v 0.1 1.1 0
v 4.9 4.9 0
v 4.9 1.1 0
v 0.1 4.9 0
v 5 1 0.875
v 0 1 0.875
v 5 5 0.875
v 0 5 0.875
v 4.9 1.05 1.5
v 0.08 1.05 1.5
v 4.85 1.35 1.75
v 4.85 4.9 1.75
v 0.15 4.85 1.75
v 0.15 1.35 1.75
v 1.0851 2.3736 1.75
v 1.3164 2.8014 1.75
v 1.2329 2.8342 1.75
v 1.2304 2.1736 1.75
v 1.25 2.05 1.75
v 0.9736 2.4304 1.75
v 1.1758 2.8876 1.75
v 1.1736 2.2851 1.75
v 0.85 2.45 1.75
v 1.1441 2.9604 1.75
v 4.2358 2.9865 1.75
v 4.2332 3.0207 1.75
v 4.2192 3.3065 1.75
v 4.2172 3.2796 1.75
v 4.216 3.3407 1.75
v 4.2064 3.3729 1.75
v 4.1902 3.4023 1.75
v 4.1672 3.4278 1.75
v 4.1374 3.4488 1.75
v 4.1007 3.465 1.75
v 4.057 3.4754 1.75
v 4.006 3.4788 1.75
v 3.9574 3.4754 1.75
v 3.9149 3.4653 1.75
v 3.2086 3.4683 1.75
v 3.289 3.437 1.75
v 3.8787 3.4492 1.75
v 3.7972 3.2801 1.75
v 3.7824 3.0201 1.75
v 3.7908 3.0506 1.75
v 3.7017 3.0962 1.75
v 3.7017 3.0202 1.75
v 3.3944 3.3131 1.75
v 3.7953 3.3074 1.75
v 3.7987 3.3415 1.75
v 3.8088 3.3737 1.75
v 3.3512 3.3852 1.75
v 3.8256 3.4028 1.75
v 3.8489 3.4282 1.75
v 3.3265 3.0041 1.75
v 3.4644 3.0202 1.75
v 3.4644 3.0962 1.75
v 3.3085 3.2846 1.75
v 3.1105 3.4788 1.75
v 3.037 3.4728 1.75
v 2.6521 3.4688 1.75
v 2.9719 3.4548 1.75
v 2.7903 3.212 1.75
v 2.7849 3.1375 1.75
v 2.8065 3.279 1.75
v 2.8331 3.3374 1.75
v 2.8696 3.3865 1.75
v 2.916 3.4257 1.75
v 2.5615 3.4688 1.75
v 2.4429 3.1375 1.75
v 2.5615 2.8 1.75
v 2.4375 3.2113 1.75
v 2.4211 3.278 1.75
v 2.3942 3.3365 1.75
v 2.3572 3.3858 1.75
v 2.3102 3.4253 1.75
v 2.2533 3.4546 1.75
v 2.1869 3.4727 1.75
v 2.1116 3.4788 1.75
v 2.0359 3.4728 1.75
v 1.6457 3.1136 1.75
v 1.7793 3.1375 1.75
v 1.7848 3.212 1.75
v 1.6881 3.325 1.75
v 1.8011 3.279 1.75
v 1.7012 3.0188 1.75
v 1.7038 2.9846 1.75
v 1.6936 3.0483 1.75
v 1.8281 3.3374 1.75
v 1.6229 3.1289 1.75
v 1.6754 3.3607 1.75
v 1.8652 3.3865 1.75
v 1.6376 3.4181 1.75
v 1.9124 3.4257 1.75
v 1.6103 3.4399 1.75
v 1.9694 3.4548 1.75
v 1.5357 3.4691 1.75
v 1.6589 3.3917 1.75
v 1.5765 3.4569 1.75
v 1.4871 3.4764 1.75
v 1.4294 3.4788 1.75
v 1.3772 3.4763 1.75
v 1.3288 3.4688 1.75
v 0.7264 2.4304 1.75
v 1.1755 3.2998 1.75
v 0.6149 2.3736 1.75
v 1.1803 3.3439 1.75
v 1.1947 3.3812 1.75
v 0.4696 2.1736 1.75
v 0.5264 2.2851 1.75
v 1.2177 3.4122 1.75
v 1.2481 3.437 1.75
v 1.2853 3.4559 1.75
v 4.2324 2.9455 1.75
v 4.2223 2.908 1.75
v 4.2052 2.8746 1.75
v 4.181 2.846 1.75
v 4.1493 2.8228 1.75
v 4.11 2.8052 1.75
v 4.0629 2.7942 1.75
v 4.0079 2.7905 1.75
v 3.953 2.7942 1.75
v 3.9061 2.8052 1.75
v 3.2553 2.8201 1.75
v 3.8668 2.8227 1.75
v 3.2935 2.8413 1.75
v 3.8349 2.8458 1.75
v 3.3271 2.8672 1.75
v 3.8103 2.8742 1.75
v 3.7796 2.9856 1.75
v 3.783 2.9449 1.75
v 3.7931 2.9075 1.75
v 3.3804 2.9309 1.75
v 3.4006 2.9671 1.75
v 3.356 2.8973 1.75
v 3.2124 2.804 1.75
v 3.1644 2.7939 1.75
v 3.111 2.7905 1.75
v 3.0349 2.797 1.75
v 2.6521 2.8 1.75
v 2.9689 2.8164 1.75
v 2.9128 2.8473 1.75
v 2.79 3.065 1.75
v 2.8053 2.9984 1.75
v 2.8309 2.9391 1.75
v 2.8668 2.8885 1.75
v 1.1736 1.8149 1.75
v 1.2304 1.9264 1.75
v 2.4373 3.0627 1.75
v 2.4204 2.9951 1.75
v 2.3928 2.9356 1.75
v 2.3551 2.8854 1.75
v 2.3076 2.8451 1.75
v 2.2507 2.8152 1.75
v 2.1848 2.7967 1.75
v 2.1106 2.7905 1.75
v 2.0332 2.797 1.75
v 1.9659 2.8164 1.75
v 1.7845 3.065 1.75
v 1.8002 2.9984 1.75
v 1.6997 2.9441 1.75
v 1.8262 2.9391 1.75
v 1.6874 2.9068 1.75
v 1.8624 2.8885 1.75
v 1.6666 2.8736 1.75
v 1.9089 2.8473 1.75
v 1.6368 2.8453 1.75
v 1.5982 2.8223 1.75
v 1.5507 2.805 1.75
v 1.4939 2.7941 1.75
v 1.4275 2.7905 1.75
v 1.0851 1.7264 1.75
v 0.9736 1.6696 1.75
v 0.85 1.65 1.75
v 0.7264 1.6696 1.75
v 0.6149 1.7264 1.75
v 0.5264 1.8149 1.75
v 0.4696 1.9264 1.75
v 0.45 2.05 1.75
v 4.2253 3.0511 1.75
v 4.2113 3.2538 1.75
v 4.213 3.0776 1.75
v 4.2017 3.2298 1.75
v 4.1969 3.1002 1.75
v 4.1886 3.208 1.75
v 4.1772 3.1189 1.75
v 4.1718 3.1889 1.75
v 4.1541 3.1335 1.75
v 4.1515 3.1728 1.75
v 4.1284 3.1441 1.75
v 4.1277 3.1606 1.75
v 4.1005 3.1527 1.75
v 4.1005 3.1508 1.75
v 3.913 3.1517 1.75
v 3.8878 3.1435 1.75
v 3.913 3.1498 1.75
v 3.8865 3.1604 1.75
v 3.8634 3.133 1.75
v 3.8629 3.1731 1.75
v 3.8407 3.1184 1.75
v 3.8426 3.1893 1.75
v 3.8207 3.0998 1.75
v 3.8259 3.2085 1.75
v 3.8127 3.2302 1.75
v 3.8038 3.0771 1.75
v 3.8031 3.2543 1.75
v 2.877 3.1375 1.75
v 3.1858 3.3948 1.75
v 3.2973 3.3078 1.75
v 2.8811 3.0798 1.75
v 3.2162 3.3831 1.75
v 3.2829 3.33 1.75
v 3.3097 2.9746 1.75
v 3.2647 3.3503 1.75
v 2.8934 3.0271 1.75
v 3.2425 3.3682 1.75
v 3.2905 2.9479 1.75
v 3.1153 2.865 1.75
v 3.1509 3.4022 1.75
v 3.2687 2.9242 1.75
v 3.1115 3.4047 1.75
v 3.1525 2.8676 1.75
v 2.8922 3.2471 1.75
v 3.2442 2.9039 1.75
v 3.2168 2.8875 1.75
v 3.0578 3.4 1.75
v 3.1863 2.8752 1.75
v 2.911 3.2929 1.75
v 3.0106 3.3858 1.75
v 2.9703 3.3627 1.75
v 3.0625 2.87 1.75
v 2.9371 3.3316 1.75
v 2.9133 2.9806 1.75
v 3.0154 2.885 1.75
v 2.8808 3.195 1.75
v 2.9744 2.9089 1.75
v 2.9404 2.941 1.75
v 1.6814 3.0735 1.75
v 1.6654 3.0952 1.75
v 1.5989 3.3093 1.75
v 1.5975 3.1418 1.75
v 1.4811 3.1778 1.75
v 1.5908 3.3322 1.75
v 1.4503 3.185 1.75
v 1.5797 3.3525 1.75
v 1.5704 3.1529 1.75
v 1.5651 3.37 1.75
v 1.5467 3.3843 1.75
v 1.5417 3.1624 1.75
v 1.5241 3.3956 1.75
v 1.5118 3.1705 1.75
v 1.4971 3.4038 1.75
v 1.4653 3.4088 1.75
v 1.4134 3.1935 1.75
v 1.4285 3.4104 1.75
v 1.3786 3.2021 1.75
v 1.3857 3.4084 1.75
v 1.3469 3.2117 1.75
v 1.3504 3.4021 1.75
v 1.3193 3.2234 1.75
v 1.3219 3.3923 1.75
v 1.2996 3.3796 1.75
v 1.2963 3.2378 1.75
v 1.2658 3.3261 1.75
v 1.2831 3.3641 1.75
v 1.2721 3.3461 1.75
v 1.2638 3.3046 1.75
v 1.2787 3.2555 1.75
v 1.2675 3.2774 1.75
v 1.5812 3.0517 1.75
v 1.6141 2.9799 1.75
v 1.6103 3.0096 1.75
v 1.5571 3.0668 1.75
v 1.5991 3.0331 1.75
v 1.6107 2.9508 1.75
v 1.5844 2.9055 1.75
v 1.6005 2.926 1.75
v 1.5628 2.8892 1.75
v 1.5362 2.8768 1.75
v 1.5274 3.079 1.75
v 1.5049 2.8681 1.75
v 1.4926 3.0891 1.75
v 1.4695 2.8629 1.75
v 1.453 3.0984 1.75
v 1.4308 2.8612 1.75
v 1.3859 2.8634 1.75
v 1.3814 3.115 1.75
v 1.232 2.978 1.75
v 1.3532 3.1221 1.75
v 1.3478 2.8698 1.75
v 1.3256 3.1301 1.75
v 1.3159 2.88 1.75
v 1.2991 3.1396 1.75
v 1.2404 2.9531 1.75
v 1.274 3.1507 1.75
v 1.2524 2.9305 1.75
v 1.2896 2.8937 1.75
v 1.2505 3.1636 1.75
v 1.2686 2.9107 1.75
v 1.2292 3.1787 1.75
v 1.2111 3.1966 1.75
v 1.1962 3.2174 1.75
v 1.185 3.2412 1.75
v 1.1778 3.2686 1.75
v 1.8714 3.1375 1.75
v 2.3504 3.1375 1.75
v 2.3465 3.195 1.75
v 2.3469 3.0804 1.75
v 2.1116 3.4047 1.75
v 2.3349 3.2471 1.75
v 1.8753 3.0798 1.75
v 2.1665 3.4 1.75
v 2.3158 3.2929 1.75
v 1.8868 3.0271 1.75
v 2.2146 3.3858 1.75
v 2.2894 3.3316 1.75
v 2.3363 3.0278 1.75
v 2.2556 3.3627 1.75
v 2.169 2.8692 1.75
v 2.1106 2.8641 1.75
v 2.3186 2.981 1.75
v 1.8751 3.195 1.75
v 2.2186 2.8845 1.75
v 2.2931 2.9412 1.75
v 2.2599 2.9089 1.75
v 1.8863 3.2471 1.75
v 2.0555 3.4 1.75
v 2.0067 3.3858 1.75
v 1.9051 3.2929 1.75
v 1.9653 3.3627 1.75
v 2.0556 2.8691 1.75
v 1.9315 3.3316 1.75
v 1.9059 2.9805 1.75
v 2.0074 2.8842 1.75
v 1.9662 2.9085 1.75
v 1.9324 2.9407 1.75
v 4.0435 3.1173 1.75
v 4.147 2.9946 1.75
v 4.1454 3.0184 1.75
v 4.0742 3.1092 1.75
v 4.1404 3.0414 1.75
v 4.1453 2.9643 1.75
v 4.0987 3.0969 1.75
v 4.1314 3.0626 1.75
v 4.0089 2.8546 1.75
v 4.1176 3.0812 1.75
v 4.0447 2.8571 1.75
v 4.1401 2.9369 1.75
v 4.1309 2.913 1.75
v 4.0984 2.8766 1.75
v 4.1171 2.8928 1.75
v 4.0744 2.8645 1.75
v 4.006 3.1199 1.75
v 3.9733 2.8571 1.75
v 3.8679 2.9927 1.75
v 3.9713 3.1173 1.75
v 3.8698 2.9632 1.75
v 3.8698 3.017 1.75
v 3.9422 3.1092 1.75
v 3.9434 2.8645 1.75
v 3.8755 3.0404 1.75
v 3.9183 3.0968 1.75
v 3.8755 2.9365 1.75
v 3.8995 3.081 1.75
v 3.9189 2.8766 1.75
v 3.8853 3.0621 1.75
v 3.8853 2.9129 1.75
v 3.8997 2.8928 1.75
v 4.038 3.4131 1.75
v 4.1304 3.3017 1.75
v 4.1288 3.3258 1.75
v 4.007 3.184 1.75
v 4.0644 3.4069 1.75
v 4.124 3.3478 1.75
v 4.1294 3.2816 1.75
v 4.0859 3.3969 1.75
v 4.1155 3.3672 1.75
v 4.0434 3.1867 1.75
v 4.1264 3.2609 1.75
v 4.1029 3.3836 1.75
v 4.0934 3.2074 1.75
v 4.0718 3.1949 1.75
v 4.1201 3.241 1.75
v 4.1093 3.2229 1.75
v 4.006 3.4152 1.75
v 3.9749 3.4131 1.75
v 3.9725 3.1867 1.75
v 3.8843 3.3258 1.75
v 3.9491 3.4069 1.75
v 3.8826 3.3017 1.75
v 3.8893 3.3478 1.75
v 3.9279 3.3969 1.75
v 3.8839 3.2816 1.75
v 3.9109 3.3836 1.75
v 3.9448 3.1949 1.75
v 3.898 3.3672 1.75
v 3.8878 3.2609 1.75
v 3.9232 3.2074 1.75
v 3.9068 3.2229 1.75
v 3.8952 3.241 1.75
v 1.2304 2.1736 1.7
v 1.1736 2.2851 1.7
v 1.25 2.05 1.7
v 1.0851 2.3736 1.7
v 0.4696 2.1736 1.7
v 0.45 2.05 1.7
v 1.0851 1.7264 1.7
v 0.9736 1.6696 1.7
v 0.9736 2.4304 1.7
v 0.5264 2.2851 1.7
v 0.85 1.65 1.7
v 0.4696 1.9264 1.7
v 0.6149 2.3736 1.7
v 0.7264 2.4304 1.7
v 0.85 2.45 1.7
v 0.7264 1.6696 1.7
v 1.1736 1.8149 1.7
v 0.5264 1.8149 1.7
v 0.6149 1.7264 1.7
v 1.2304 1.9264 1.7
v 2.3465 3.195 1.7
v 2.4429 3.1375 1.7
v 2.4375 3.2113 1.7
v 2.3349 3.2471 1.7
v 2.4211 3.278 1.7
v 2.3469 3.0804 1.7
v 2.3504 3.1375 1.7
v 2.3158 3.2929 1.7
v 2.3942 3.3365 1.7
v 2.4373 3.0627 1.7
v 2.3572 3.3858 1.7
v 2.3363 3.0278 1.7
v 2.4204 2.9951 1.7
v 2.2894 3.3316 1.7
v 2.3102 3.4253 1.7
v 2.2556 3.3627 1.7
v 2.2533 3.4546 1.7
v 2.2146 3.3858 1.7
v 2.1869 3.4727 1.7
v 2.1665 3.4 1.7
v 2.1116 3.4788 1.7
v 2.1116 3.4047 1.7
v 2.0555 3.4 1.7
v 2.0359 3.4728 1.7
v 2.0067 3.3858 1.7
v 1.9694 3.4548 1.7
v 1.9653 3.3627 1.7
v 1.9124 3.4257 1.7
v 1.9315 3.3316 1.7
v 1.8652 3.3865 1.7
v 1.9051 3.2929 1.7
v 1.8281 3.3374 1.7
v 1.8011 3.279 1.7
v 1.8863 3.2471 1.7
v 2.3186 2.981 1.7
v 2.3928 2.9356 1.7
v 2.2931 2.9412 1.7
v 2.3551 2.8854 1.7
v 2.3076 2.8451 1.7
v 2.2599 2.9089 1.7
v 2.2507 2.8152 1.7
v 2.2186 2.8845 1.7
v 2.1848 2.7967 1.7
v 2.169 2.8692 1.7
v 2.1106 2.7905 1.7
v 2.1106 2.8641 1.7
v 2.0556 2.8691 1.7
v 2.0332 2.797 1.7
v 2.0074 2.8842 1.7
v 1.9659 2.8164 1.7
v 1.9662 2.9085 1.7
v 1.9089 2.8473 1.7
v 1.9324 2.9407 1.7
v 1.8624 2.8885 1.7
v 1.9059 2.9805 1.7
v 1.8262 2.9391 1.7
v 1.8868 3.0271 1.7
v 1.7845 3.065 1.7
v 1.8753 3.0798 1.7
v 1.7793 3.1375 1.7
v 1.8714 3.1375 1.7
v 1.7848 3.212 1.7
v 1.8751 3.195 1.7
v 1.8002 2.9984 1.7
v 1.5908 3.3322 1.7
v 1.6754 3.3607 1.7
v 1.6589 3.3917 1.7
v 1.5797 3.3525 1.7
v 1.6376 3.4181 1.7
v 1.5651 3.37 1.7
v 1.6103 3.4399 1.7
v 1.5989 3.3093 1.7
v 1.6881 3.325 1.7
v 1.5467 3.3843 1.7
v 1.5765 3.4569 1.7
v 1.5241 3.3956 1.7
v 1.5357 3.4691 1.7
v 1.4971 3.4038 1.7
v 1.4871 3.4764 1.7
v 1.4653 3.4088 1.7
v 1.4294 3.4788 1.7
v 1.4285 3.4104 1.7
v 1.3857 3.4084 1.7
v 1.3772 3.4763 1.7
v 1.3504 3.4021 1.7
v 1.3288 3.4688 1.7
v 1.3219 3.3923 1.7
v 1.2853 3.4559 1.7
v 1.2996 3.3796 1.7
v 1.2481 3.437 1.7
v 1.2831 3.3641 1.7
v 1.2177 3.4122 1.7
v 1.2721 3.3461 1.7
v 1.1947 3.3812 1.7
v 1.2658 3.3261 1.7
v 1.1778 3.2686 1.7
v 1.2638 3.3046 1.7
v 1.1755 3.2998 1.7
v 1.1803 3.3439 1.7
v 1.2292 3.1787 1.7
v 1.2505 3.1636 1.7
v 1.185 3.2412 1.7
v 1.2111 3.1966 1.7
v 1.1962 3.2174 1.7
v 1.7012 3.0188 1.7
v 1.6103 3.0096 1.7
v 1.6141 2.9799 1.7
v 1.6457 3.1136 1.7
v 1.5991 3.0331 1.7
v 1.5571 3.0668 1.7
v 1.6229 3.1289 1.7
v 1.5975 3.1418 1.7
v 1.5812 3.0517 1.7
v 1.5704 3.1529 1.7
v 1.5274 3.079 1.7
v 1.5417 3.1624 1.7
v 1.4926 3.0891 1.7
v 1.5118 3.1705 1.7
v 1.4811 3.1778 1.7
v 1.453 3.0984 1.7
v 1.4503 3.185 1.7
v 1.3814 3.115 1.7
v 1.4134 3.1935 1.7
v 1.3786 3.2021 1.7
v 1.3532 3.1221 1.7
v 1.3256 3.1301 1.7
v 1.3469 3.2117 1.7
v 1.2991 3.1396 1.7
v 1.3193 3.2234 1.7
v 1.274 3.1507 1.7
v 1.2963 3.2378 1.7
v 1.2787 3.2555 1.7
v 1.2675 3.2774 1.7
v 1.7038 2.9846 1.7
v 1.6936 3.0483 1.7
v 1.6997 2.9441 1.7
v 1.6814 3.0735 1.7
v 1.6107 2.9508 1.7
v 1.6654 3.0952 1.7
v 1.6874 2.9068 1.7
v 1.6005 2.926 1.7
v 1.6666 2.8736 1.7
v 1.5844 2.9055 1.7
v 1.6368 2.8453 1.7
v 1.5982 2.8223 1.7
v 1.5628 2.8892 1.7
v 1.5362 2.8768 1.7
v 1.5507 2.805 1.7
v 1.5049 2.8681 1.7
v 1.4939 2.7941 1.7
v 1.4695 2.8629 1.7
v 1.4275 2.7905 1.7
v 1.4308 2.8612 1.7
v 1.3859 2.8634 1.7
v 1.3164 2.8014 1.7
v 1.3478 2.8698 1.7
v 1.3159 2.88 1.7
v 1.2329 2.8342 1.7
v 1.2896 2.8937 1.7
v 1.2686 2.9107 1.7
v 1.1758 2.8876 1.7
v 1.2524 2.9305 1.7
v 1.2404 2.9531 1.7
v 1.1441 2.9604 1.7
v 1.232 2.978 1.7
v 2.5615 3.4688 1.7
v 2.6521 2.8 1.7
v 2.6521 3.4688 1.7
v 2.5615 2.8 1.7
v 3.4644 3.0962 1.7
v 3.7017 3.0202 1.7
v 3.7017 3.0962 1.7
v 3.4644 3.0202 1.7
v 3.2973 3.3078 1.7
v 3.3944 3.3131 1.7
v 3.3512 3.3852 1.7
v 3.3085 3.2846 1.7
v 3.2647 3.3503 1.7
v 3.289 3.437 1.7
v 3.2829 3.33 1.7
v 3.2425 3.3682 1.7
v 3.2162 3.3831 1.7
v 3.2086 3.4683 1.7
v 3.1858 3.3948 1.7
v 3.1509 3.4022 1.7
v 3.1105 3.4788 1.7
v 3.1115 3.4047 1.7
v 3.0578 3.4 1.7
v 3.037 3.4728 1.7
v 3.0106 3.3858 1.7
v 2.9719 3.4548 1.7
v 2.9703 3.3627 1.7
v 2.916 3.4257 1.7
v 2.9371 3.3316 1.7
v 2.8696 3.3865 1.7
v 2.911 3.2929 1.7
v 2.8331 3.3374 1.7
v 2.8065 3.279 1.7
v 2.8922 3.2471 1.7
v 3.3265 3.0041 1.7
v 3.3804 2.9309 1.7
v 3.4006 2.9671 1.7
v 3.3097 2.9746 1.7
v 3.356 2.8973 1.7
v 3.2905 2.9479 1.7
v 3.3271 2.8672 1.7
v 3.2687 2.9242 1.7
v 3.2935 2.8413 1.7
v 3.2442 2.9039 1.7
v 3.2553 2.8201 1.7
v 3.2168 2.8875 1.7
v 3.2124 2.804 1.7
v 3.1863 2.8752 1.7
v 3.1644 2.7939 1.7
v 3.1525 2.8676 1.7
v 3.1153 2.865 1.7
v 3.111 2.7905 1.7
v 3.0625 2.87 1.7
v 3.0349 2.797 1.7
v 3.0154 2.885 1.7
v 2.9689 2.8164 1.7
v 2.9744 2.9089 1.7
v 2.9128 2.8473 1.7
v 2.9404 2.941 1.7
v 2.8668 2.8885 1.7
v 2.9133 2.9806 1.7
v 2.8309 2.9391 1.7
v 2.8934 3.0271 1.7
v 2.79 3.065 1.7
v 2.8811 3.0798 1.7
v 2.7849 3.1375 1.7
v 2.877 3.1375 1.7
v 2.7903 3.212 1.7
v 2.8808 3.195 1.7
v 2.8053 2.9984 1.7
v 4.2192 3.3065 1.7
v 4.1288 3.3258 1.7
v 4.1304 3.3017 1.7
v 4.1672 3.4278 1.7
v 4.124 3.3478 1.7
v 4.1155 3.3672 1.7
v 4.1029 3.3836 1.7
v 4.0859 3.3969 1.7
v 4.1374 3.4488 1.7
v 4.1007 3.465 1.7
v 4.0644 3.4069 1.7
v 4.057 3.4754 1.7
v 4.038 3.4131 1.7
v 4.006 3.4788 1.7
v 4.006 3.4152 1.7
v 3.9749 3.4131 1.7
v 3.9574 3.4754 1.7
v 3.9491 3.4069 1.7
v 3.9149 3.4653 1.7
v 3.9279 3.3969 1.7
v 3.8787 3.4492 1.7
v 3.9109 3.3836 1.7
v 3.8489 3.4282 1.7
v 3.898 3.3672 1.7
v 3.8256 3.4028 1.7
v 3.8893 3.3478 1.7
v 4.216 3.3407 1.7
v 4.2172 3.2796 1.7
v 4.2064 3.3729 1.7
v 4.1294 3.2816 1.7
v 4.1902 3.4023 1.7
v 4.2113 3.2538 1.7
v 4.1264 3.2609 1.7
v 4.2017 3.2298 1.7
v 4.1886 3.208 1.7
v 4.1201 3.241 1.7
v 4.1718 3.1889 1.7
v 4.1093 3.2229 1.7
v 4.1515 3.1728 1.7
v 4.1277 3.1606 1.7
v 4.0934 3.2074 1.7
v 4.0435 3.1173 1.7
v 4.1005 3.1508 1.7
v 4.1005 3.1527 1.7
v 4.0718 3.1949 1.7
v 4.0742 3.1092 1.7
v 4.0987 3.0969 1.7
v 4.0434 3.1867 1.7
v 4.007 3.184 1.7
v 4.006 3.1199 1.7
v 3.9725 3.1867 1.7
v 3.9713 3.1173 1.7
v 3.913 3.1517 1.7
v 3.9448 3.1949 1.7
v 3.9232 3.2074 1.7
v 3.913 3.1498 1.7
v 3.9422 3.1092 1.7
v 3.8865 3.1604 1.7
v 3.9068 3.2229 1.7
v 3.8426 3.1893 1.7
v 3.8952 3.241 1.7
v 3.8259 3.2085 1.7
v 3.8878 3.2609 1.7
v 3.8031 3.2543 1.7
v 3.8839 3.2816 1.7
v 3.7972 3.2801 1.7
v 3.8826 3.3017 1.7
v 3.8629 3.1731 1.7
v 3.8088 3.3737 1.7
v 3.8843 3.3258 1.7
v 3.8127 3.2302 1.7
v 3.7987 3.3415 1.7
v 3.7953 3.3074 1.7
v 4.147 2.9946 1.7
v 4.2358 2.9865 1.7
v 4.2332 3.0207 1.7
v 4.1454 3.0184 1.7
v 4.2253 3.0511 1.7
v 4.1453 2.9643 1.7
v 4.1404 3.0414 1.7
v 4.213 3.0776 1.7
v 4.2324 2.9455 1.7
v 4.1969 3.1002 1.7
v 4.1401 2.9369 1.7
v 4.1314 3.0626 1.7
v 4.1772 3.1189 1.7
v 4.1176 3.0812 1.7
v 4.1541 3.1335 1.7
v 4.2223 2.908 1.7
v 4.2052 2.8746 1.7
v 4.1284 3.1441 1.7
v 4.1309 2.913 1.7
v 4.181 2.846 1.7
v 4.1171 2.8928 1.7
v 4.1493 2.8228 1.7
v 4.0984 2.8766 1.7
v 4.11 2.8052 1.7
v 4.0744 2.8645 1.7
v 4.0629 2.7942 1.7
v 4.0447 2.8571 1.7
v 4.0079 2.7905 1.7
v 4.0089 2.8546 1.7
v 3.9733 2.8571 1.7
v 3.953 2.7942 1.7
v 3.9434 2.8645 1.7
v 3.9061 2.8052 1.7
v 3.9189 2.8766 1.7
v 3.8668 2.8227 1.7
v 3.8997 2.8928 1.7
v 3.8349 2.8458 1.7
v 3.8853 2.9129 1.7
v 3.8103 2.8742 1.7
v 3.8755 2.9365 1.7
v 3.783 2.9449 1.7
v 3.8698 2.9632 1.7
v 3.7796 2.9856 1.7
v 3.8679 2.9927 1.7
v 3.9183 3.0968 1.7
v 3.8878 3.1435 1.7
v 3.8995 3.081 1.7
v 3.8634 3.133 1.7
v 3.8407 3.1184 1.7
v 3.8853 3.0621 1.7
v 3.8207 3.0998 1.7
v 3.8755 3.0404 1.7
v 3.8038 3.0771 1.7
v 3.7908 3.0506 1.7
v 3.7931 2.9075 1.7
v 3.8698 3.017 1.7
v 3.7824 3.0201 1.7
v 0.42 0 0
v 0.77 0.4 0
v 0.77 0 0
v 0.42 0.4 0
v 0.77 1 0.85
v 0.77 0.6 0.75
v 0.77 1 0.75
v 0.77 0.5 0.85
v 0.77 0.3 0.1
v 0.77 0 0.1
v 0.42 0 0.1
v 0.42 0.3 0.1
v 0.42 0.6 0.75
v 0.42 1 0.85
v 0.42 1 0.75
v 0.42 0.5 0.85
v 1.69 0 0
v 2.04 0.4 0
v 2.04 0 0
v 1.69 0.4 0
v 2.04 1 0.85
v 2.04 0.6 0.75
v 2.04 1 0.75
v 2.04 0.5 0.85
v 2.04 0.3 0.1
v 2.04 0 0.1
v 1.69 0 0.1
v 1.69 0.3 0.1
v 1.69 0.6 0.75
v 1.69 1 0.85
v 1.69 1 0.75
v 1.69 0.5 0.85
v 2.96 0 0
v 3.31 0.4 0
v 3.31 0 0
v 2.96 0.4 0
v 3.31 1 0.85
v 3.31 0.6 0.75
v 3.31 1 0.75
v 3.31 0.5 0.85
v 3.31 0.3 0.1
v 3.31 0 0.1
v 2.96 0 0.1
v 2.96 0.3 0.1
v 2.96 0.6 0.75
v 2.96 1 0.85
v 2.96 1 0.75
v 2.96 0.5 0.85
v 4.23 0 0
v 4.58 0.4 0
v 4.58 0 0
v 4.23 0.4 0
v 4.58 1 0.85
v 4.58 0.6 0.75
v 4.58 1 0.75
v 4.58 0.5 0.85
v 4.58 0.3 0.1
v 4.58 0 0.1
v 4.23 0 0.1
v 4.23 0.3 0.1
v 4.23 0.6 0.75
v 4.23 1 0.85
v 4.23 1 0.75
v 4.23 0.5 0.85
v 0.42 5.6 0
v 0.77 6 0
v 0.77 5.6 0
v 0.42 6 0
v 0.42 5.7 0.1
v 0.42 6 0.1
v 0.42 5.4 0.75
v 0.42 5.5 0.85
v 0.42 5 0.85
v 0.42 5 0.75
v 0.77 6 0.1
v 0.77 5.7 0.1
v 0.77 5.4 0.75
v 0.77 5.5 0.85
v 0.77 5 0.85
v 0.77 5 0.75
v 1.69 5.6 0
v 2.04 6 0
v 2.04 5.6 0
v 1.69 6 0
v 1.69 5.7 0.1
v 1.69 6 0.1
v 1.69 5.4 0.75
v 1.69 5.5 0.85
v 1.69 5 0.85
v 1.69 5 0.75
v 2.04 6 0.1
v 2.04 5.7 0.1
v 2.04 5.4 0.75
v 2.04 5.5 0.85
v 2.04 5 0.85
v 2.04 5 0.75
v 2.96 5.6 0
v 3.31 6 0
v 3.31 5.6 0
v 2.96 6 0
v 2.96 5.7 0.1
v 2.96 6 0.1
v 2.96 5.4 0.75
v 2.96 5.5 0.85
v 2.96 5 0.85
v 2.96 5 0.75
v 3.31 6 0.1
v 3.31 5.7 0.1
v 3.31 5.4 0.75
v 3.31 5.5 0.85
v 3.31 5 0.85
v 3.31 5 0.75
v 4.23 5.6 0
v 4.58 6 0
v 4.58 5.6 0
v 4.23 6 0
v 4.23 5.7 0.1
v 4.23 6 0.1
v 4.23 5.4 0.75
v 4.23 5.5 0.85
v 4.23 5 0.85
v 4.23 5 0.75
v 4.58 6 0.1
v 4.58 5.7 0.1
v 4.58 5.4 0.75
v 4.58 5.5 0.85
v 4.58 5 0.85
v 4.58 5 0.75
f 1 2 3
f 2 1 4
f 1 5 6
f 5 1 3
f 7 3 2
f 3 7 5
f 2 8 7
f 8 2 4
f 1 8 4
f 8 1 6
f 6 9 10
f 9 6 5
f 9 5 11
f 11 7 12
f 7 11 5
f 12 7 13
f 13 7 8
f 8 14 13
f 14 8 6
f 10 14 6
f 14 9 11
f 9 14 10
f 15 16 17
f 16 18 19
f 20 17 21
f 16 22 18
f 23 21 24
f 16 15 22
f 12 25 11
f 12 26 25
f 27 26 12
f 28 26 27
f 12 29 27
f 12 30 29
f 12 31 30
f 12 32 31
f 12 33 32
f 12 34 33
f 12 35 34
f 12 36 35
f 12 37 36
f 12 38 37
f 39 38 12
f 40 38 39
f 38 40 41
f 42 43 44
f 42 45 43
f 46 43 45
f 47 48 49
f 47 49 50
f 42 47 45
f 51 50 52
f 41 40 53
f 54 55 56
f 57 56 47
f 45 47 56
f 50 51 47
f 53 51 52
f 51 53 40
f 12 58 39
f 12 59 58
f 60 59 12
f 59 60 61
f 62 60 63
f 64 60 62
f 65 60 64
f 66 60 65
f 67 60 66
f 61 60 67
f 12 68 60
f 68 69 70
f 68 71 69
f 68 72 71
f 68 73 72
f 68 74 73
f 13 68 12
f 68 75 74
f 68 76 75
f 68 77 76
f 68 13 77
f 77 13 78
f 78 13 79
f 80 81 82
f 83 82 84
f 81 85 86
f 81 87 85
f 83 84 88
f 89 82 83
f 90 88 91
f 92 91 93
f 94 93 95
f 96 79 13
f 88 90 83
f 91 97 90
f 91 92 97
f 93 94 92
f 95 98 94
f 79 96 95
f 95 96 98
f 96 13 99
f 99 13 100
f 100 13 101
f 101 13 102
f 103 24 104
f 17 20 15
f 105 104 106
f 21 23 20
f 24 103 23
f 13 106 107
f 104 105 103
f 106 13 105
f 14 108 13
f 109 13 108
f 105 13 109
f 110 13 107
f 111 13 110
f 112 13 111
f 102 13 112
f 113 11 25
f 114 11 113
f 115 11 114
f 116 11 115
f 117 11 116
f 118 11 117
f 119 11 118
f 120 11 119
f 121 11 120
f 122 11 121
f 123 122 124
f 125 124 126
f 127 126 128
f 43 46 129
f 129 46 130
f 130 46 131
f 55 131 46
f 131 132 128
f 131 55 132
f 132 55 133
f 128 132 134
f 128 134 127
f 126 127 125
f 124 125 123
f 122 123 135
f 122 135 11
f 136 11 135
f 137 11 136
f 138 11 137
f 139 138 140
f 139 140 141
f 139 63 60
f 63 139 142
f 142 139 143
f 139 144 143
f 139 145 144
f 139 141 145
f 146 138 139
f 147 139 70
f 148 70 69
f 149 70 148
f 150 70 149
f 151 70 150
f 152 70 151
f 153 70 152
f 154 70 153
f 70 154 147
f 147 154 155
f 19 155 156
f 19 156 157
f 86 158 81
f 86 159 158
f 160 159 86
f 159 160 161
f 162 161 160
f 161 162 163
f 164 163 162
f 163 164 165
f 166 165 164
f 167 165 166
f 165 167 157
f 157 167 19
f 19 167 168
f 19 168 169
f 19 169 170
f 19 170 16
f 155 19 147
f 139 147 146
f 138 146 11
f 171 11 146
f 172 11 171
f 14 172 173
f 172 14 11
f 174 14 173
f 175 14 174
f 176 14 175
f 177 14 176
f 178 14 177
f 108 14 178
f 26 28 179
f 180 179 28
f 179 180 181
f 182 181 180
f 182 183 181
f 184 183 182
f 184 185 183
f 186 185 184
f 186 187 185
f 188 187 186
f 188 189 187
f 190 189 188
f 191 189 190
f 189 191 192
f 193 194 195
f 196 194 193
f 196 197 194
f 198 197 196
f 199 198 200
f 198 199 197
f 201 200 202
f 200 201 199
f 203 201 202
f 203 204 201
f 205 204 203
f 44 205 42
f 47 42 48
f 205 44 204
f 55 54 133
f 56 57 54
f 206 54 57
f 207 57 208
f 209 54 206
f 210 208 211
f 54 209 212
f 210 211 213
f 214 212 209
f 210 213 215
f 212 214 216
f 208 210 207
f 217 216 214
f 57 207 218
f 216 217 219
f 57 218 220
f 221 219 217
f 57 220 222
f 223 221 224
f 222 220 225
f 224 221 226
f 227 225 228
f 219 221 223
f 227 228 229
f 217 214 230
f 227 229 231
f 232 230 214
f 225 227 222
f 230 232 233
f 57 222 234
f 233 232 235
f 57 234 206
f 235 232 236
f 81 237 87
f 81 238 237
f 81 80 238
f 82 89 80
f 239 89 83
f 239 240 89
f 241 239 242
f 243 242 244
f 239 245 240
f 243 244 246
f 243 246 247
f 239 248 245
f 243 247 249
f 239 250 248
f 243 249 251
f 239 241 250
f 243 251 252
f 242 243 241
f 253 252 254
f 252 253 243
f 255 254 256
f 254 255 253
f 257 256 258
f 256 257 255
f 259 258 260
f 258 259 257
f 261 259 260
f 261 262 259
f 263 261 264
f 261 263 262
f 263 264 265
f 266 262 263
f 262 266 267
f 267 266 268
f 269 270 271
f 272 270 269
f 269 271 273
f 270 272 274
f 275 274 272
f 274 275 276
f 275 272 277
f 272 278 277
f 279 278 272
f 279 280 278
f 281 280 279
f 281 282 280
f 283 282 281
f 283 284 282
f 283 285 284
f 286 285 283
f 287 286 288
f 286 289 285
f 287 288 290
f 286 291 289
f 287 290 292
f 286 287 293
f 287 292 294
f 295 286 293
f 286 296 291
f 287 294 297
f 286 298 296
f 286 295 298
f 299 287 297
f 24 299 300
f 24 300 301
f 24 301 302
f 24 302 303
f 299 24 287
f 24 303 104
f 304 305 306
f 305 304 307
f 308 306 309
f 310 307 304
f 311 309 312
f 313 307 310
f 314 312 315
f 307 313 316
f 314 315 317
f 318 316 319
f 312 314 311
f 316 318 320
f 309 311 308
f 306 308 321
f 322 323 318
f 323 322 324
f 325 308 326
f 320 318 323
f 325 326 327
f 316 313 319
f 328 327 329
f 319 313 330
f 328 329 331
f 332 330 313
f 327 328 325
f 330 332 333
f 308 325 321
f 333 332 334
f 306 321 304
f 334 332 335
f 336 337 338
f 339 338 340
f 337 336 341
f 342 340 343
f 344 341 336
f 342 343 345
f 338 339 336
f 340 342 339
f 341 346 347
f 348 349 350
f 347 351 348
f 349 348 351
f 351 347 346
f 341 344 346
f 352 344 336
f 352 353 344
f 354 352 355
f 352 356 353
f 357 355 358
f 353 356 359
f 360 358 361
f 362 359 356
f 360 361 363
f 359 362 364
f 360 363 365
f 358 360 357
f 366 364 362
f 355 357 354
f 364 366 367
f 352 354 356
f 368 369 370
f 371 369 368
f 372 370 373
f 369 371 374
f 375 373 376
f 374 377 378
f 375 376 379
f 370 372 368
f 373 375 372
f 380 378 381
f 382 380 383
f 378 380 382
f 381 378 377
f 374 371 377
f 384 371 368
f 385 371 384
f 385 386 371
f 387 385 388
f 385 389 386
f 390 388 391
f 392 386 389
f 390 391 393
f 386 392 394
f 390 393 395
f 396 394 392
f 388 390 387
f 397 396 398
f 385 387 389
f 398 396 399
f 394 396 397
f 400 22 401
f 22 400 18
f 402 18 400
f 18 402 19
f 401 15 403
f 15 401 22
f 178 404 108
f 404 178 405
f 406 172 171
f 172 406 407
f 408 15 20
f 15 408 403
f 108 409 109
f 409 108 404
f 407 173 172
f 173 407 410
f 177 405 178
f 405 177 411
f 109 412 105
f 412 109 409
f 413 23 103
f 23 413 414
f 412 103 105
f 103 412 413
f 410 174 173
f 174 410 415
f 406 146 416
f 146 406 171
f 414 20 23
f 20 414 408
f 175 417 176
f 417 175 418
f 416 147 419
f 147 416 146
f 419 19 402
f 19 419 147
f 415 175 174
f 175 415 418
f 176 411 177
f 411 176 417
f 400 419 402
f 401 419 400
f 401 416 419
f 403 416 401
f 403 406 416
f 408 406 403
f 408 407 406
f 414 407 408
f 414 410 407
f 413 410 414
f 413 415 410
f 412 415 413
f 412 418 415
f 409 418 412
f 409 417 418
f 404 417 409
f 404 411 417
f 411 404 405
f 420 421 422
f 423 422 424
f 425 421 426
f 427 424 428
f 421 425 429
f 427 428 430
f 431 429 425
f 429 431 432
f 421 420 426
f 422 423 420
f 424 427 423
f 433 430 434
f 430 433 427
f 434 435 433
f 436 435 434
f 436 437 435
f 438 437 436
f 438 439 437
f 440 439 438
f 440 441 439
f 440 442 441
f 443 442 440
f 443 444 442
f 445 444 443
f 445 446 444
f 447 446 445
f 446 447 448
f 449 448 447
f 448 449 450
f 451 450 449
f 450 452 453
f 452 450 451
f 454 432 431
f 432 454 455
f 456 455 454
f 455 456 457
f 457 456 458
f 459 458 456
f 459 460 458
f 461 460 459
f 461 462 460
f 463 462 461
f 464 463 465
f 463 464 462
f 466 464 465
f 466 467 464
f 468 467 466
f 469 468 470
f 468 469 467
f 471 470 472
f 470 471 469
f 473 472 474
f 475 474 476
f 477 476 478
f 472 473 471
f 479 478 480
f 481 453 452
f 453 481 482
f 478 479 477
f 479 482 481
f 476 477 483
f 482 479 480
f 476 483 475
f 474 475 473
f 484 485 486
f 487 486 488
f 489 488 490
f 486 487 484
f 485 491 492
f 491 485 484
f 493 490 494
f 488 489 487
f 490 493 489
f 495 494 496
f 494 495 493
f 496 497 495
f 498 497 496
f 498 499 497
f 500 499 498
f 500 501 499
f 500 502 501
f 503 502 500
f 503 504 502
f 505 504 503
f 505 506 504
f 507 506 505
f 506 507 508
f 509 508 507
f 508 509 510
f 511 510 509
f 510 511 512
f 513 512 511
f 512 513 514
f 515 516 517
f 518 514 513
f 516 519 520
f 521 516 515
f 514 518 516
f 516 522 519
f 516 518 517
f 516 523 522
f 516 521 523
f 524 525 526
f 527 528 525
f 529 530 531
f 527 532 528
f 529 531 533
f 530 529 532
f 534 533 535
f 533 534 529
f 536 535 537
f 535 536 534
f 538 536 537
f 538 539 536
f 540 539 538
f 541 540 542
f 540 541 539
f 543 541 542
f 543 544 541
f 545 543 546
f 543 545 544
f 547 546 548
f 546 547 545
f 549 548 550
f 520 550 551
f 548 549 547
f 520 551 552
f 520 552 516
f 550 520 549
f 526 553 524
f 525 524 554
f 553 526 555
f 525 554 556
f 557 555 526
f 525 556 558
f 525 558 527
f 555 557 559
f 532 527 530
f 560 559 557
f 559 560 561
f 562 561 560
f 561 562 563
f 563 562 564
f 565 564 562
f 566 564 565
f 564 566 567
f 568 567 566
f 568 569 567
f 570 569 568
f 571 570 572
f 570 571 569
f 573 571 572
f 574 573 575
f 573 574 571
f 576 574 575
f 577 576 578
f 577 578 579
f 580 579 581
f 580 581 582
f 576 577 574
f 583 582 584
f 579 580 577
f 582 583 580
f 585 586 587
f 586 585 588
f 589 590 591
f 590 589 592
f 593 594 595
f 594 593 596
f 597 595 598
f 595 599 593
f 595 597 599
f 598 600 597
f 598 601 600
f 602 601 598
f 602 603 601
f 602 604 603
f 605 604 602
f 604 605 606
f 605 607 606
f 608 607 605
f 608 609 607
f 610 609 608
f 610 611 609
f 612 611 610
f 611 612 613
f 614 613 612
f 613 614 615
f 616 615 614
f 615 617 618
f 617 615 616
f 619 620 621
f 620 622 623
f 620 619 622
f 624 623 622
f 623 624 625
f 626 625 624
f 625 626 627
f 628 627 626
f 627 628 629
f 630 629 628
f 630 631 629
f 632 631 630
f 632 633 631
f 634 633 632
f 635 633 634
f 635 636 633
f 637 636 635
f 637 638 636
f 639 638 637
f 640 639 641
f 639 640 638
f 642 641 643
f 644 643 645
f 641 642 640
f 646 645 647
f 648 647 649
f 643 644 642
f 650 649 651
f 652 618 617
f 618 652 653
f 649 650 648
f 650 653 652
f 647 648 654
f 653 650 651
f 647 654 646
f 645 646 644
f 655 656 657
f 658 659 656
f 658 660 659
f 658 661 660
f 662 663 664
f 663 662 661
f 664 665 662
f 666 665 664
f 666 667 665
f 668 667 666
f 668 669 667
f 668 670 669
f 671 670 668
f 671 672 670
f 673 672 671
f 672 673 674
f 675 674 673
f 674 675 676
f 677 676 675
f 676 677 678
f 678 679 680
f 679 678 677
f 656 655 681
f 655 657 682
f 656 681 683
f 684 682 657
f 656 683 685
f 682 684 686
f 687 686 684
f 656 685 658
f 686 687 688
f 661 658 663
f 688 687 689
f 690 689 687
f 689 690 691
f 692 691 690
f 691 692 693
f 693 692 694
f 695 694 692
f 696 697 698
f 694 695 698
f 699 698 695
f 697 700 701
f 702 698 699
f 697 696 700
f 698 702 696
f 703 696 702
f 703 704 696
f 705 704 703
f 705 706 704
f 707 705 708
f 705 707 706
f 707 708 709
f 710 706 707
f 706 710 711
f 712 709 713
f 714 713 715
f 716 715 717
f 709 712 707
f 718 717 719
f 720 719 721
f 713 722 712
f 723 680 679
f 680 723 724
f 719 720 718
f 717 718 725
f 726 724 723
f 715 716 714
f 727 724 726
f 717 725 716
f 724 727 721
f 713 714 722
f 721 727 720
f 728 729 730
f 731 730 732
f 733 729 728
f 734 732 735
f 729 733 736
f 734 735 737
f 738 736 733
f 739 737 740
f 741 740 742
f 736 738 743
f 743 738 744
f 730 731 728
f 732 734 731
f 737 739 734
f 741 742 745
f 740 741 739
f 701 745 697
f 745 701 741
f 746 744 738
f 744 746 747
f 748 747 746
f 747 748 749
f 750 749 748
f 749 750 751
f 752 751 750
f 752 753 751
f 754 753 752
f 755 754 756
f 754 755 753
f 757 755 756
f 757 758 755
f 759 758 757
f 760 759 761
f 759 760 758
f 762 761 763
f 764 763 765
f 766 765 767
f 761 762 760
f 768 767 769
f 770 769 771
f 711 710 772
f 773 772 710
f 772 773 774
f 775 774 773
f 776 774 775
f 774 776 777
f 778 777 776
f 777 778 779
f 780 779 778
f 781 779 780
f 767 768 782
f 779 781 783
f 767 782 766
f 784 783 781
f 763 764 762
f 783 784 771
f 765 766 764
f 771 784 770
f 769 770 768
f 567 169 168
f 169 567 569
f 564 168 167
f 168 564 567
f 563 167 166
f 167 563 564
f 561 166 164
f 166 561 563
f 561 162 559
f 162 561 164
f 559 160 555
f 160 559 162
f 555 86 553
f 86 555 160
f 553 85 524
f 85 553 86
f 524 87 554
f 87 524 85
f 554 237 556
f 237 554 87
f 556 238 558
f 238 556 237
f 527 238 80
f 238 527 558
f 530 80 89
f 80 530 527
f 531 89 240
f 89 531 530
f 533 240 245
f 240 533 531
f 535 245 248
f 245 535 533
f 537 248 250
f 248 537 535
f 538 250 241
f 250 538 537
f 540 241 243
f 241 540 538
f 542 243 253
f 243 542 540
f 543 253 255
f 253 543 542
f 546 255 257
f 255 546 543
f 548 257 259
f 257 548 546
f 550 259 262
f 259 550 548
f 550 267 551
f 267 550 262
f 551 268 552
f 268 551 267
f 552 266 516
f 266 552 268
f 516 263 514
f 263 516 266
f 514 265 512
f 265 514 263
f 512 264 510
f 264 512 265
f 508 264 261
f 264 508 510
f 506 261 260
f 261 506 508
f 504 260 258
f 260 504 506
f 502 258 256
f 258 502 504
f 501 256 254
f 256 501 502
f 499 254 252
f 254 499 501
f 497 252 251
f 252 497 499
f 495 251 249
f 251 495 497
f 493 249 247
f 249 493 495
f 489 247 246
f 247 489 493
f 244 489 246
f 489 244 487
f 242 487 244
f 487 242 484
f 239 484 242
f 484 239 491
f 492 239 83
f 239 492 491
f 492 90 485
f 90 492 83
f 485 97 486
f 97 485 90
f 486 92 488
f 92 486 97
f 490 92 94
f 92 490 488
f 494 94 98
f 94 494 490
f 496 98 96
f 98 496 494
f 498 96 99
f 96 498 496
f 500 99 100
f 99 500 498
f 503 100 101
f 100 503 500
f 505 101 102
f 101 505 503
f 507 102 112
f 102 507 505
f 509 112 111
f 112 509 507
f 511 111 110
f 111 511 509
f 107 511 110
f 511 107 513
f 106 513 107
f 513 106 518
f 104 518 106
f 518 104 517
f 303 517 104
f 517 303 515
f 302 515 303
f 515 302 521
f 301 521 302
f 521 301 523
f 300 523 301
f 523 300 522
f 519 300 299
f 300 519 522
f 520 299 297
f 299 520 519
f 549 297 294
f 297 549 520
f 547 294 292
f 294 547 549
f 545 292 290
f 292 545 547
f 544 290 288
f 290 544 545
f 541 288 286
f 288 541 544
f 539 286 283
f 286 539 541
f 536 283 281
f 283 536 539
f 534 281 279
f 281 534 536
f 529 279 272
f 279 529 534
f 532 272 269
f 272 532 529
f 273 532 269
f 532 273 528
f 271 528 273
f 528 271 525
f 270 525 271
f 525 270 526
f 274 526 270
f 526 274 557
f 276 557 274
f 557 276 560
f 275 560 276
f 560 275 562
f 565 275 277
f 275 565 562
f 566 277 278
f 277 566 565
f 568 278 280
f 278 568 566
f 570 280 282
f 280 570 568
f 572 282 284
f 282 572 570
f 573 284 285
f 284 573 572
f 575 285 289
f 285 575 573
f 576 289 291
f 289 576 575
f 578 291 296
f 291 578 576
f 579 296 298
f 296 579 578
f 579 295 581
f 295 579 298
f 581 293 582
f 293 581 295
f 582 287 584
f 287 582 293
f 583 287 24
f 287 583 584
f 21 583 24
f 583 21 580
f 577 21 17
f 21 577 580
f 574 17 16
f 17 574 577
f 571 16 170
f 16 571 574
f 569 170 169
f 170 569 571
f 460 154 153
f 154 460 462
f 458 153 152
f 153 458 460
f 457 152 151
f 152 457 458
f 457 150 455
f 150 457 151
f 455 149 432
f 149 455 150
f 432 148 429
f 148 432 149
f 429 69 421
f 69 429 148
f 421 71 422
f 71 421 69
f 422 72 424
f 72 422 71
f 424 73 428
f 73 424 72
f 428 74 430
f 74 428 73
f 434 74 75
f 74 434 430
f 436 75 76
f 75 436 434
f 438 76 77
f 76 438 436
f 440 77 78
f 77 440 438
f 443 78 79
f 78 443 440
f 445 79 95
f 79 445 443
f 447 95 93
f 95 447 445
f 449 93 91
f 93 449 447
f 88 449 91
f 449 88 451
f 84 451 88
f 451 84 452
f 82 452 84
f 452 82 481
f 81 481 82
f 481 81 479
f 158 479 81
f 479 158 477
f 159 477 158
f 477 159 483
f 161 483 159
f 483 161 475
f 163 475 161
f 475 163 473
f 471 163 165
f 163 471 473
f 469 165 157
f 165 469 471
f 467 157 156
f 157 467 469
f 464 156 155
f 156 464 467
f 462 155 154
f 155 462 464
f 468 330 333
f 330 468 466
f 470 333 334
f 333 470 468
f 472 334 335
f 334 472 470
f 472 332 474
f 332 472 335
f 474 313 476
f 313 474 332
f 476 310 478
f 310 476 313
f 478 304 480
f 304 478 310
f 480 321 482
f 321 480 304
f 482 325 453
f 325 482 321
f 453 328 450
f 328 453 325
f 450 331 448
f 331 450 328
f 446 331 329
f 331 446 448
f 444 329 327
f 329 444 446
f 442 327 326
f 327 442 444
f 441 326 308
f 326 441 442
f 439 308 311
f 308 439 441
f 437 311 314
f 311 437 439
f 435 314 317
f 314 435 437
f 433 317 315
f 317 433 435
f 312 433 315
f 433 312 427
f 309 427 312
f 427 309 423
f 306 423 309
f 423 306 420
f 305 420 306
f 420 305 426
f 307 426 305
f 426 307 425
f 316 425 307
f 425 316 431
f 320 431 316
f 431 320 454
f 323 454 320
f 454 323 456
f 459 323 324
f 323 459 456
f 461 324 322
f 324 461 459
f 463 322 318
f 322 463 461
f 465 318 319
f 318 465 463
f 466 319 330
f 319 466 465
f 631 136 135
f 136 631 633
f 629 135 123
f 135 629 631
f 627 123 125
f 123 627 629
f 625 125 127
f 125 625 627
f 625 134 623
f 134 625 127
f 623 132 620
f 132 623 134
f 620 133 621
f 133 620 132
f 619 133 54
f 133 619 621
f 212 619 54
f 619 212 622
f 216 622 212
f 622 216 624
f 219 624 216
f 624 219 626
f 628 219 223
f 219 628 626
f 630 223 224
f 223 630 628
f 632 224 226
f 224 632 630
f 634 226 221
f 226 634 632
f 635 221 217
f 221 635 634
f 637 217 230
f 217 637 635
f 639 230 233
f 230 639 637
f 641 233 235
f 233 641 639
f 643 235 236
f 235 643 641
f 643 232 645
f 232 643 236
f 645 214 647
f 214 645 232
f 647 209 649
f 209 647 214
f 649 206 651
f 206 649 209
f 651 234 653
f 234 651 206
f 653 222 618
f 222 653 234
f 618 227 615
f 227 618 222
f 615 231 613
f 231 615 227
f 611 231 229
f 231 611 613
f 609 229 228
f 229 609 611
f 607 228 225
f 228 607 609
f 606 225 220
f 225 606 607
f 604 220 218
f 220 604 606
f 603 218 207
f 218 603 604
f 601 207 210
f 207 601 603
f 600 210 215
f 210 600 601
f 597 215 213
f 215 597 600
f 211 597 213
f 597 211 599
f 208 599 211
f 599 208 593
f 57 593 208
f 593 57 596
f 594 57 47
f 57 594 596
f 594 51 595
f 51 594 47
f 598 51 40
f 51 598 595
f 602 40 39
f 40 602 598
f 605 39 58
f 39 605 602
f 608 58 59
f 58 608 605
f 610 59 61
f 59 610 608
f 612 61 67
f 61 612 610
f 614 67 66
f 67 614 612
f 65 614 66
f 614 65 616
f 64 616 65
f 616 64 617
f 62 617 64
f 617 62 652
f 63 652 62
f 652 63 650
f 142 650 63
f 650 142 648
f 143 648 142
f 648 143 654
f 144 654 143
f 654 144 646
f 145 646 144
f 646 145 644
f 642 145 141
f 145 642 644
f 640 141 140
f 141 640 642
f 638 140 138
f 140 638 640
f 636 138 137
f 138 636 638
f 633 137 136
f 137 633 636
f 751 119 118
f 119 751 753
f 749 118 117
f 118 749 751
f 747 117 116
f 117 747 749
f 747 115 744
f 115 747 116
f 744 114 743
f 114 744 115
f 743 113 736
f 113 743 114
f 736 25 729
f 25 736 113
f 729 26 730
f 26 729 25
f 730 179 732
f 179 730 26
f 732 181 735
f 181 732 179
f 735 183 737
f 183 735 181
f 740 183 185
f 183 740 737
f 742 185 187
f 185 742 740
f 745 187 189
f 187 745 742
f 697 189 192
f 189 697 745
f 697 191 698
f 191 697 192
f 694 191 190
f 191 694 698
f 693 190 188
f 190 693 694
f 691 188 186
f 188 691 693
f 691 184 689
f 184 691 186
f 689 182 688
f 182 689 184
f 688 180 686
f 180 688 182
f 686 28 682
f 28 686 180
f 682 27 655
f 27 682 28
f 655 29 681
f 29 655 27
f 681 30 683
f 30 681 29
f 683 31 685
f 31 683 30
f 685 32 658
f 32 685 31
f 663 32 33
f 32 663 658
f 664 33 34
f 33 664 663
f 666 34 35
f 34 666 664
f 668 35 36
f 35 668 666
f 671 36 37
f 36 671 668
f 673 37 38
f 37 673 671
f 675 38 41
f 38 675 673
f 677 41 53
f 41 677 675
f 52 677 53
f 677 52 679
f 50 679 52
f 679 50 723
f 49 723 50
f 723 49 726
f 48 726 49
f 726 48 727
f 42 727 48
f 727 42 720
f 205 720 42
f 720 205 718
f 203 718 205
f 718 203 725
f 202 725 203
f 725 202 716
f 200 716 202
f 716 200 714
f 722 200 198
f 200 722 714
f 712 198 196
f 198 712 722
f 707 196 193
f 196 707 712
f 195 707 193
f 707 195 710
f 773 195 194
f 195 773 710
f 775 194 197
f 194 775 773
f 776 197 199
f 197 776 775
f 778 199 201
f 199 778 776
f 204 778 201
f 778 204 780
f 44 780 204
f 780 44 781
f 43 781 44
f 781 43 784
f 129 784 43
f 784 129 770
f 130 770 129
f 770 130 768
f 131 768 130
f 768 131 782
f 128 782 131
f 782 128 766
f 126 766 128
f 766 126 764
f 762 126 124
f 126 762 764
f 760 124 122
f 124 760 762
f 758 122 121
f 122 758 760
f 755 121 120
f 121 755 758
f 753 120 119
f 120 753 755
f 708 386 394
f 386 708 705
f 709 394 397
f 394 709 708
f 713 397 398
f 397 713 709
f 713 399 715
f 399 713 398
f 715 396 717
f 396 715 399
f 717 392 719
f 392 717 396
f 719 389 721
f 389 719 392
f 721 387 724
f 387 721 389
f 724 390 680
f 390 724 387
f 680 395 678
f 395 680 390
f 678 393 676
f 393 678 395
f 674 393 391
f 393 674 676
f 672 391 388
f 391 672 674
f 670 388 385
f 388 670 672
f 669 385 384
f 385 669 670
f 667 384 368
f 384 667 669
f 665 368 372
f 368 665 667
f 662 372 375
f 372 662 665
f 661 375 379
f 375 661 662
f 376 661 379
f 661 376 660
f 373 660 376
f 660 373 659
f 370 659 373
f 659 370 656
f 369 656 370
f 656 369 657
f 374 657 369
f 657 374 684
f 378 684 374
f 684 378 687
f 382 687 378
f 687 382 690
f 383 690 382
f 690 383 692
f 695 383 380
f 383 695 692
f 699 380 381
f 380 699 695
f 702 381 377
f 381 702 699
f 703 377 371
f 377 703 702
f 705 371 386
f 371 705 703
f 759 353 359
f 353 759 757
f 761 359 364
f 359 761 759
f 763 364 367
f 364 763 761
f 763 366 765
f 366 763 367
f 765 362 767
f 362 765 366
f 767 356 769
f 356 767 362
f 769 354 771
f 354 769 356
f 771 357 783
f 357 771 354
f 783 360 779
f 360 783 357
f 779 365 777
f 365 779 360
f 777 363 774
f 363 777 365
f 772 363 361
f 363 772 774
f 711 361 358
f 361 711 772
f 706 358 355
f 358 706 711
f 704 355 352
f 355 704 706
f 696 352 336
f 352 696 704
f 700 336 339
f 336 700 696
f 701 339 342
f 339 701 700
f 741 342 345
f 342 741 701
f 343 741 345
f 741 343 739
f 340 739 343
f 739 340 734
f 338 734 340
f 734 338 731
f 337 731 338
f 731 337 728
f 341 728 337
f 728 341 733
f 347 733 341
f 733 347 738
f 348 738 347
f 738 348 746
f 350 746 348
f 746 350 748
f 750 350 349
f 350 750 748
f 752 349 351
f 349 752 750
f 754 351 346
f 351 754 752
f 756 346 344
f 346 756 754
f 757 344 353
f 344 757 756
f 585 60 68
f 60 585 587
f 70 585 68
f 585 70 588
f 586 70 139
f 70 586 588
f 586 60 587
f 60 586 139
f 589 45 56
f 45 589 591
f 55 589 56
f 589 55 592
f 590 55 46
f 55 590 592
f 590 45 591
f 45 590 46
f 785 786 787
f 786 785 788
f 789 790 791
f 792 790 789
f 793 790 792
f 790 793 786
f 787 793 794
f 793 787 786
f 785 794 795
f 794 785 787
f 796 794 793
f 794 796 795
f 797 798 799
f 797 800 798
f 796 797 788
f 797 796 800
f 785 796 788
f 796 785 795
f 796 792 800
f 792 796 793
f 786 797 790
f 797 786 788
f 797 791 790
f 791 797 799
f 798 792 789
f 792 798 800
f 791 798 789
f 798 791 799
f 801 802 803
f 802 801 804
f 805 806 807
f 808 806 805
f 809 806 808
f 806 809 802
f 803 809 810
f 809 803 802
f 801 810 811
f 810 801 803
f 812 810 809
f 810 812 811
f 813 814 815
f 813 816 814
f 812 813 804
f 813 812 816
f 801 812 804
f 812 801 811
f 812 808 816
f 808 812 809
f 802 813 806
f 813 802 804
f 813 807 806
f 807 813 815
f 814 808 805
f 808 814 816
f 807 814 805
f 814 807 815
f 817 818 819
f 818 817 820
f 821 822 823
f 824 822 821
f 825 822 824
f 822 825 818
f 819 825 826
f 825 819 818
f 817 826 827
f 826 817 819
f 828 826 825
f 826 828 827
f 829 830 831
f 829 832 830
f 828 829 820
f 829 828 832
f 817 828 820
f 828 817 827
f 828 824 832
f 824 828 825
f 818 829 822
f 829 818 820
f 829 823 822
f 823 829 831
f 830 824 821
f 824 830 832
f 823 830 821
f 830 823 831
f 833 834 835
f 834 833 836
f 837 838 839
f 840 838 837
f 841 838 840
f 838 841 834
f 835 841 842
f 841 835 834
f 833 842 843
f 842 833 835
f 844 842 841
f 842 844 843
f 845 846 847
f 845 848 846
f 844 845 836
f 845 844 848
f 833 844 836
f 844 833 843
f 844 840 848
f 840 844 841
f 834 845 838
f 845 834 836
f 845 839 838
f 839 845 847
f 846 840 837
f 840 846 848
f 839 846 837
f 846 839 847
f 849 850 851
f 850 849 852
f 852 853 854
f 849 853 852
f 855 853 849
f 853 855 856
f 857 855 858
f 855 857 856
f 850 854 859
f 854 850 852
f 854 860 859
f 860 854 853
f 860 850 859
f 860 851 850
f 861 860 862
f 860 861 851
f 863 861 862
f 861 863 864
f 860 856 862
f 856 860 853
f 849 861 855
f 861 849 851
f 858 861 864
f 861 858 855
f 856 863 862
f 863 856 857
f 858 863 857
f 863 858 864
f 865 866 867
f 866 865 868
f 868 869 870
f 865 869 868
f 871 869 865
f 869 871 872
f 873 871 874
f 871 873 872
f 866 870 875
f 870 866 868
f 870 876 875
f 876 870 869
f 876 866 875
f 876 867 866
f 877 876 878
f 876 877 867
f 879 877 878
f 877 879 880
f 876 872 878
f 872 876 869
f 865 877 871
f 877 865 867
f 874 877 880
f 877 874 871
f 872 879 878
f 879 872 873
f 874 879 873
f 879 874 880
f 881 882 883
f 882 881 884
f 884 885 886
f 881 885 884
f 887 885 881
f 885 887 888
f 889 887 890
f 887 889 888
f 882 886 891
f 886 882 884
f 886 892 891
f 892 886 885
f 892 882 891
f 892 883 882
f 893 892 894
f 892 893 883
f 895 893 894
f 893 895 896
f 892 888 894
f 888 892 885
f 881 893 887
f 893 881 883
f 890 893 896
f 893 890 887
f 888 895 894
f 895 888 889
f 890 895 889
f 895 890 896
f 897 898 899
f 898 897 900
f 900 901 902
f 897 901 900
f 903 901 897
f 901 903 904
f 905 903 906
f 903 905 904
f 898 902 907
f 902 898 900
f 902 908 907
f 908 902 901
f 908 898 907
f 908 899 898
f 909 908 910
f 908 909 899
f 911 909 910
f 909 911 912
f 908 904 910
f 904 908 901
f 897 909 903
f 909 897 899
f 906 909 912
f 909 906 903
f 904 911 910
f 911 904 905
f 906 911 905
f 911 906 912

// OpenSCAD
// the body of the IC
module body(label) {

translate([0,1,0]) { 
    difference() {
        color("SlateGrey")
 polyhedron(
    // clockwise looking down from z axis from origin
    points=[ 
    [0.1,0.1,0], [4.9,0.1,0], [4.9,3.9,0], [0.1,3.9,0], // the bottom rectangle
    [0,0,0.875], [5,0,0.875], [5,4,0.875], [0,4,0.875], // the middle horizontal
    [0.08,0.05,1.50], [4.90,0.05,1.50], // points on lower of angled edge
    [0.15,0.35,1.75], [4.85,0.35,1.75], [4.85,3.9,1.75], [0.15,3.85,1.75] // the top rectangle, less the angled face
    ],
    faces=[ [0,1,2,3], // bottom
    [0,4,5,1], [1,5,6,2], [2,6,7,3], [3,7,4,0], // lower vertical faces
    [4,8,9,5], [5,9,11,12,6],[6,12,13,7],[7,13,10,8,4], // upper vertical faces
    [8,10,11,9],// the angled face
    [10,13,12,11] // top
    ] 
    );
    
    translate([0.85, 1.05, 1.7]) cylinder(h=0.05, r=0.40, $fn=20); // the dot for pin 1
    translate([1.10 , 1.8, 1.7]) color("White") linear_extrude(height=0.05) { text(label, size=0.7);}     // the label
};
 
}
}

// offset to first leg = (5 - (1.27*3))/2=0.595
module leg(num) {
    translate([-0.175,0,0])
    color("Silver") 
    
    union() {
        polyhedron(
            points=[[0,0,0], [0.35,0,0], [0.35,0.4,0], [0,0.4,0],
                    [0,0,0.1],[0.35,0,0.1],[0.35,0.3,0.1],[0,0.3,0.1]],
            faces=[ [0,1,2,3],      // bottom
                    [0,4,5,1],      // end cap
                    [4,7,6,5],      // top
                    [1,5,6,2],      // side
                    [0,3,7,4],      // side
                    [2,6,7,3]       // end cap
                  ]
        );
        
        polyhedron(
            points=[[0,0.3,0.1],[0.35,0.3,0.1],[0.35,0.4,0], [0,0.4,0], , 
                    [0,0.5,0.85],[0.35,0.5,0.85],[0.35,0.6,0.75],[0,0.6,0.75],],
            faces=[ [0,1,2,3],      // bottom
                    [0,4,5,1],      // end cap
                    [4,7,6,5],      // top
                    [1,5,6,2],      // side
                    [0,3,7,4],      // side
                    [2,6,7,3]       // end cap
                  ]
        );
       
        polyhedron(
            points=[[0,0.6,0.75],[0.35,0.6,0.75],[0.35,1.0,0.75],[0,1.0,0.75],
                [0,0.5,0.85],[0.35,0.5,0.85],[0.35,1,0.85],[0,1,0.85] ],
            faces=[ 
                    [0,1,2,3],      // bottom
                    [0,4,5,1],      // end cap
                    [4,7,6,5],      // top
                    [1,5,6,2],      // side
                    [0,3,7,4],      // side
                    [2,6,7,3]       // end cap
                  ]
        );
    }
    
}

module ic(label) {
    union() {
        body(label);
        
        translate([0.595+0*1.27,0,0]) leg();
        translate([0.595+1.27,0,0]) leg();
        translate([0.595+2*1.27,0,0]) leg();
        translate([0.595+3*1.27,0,0]) leg();

        translate([0.595+0*1.27,6,0]) rotate([0,0,180])leg();
        translate([0.595+1*1.27,6,0]) rotate([0,0,180])leg();
        translate([0.595+2*1.27,6,0]) rotate([0,0,180])leg();
        translate([0.595+3*1.27,6,0]) rotate([0,0,180])leg();
    }
}

ic("SOIC-8");
